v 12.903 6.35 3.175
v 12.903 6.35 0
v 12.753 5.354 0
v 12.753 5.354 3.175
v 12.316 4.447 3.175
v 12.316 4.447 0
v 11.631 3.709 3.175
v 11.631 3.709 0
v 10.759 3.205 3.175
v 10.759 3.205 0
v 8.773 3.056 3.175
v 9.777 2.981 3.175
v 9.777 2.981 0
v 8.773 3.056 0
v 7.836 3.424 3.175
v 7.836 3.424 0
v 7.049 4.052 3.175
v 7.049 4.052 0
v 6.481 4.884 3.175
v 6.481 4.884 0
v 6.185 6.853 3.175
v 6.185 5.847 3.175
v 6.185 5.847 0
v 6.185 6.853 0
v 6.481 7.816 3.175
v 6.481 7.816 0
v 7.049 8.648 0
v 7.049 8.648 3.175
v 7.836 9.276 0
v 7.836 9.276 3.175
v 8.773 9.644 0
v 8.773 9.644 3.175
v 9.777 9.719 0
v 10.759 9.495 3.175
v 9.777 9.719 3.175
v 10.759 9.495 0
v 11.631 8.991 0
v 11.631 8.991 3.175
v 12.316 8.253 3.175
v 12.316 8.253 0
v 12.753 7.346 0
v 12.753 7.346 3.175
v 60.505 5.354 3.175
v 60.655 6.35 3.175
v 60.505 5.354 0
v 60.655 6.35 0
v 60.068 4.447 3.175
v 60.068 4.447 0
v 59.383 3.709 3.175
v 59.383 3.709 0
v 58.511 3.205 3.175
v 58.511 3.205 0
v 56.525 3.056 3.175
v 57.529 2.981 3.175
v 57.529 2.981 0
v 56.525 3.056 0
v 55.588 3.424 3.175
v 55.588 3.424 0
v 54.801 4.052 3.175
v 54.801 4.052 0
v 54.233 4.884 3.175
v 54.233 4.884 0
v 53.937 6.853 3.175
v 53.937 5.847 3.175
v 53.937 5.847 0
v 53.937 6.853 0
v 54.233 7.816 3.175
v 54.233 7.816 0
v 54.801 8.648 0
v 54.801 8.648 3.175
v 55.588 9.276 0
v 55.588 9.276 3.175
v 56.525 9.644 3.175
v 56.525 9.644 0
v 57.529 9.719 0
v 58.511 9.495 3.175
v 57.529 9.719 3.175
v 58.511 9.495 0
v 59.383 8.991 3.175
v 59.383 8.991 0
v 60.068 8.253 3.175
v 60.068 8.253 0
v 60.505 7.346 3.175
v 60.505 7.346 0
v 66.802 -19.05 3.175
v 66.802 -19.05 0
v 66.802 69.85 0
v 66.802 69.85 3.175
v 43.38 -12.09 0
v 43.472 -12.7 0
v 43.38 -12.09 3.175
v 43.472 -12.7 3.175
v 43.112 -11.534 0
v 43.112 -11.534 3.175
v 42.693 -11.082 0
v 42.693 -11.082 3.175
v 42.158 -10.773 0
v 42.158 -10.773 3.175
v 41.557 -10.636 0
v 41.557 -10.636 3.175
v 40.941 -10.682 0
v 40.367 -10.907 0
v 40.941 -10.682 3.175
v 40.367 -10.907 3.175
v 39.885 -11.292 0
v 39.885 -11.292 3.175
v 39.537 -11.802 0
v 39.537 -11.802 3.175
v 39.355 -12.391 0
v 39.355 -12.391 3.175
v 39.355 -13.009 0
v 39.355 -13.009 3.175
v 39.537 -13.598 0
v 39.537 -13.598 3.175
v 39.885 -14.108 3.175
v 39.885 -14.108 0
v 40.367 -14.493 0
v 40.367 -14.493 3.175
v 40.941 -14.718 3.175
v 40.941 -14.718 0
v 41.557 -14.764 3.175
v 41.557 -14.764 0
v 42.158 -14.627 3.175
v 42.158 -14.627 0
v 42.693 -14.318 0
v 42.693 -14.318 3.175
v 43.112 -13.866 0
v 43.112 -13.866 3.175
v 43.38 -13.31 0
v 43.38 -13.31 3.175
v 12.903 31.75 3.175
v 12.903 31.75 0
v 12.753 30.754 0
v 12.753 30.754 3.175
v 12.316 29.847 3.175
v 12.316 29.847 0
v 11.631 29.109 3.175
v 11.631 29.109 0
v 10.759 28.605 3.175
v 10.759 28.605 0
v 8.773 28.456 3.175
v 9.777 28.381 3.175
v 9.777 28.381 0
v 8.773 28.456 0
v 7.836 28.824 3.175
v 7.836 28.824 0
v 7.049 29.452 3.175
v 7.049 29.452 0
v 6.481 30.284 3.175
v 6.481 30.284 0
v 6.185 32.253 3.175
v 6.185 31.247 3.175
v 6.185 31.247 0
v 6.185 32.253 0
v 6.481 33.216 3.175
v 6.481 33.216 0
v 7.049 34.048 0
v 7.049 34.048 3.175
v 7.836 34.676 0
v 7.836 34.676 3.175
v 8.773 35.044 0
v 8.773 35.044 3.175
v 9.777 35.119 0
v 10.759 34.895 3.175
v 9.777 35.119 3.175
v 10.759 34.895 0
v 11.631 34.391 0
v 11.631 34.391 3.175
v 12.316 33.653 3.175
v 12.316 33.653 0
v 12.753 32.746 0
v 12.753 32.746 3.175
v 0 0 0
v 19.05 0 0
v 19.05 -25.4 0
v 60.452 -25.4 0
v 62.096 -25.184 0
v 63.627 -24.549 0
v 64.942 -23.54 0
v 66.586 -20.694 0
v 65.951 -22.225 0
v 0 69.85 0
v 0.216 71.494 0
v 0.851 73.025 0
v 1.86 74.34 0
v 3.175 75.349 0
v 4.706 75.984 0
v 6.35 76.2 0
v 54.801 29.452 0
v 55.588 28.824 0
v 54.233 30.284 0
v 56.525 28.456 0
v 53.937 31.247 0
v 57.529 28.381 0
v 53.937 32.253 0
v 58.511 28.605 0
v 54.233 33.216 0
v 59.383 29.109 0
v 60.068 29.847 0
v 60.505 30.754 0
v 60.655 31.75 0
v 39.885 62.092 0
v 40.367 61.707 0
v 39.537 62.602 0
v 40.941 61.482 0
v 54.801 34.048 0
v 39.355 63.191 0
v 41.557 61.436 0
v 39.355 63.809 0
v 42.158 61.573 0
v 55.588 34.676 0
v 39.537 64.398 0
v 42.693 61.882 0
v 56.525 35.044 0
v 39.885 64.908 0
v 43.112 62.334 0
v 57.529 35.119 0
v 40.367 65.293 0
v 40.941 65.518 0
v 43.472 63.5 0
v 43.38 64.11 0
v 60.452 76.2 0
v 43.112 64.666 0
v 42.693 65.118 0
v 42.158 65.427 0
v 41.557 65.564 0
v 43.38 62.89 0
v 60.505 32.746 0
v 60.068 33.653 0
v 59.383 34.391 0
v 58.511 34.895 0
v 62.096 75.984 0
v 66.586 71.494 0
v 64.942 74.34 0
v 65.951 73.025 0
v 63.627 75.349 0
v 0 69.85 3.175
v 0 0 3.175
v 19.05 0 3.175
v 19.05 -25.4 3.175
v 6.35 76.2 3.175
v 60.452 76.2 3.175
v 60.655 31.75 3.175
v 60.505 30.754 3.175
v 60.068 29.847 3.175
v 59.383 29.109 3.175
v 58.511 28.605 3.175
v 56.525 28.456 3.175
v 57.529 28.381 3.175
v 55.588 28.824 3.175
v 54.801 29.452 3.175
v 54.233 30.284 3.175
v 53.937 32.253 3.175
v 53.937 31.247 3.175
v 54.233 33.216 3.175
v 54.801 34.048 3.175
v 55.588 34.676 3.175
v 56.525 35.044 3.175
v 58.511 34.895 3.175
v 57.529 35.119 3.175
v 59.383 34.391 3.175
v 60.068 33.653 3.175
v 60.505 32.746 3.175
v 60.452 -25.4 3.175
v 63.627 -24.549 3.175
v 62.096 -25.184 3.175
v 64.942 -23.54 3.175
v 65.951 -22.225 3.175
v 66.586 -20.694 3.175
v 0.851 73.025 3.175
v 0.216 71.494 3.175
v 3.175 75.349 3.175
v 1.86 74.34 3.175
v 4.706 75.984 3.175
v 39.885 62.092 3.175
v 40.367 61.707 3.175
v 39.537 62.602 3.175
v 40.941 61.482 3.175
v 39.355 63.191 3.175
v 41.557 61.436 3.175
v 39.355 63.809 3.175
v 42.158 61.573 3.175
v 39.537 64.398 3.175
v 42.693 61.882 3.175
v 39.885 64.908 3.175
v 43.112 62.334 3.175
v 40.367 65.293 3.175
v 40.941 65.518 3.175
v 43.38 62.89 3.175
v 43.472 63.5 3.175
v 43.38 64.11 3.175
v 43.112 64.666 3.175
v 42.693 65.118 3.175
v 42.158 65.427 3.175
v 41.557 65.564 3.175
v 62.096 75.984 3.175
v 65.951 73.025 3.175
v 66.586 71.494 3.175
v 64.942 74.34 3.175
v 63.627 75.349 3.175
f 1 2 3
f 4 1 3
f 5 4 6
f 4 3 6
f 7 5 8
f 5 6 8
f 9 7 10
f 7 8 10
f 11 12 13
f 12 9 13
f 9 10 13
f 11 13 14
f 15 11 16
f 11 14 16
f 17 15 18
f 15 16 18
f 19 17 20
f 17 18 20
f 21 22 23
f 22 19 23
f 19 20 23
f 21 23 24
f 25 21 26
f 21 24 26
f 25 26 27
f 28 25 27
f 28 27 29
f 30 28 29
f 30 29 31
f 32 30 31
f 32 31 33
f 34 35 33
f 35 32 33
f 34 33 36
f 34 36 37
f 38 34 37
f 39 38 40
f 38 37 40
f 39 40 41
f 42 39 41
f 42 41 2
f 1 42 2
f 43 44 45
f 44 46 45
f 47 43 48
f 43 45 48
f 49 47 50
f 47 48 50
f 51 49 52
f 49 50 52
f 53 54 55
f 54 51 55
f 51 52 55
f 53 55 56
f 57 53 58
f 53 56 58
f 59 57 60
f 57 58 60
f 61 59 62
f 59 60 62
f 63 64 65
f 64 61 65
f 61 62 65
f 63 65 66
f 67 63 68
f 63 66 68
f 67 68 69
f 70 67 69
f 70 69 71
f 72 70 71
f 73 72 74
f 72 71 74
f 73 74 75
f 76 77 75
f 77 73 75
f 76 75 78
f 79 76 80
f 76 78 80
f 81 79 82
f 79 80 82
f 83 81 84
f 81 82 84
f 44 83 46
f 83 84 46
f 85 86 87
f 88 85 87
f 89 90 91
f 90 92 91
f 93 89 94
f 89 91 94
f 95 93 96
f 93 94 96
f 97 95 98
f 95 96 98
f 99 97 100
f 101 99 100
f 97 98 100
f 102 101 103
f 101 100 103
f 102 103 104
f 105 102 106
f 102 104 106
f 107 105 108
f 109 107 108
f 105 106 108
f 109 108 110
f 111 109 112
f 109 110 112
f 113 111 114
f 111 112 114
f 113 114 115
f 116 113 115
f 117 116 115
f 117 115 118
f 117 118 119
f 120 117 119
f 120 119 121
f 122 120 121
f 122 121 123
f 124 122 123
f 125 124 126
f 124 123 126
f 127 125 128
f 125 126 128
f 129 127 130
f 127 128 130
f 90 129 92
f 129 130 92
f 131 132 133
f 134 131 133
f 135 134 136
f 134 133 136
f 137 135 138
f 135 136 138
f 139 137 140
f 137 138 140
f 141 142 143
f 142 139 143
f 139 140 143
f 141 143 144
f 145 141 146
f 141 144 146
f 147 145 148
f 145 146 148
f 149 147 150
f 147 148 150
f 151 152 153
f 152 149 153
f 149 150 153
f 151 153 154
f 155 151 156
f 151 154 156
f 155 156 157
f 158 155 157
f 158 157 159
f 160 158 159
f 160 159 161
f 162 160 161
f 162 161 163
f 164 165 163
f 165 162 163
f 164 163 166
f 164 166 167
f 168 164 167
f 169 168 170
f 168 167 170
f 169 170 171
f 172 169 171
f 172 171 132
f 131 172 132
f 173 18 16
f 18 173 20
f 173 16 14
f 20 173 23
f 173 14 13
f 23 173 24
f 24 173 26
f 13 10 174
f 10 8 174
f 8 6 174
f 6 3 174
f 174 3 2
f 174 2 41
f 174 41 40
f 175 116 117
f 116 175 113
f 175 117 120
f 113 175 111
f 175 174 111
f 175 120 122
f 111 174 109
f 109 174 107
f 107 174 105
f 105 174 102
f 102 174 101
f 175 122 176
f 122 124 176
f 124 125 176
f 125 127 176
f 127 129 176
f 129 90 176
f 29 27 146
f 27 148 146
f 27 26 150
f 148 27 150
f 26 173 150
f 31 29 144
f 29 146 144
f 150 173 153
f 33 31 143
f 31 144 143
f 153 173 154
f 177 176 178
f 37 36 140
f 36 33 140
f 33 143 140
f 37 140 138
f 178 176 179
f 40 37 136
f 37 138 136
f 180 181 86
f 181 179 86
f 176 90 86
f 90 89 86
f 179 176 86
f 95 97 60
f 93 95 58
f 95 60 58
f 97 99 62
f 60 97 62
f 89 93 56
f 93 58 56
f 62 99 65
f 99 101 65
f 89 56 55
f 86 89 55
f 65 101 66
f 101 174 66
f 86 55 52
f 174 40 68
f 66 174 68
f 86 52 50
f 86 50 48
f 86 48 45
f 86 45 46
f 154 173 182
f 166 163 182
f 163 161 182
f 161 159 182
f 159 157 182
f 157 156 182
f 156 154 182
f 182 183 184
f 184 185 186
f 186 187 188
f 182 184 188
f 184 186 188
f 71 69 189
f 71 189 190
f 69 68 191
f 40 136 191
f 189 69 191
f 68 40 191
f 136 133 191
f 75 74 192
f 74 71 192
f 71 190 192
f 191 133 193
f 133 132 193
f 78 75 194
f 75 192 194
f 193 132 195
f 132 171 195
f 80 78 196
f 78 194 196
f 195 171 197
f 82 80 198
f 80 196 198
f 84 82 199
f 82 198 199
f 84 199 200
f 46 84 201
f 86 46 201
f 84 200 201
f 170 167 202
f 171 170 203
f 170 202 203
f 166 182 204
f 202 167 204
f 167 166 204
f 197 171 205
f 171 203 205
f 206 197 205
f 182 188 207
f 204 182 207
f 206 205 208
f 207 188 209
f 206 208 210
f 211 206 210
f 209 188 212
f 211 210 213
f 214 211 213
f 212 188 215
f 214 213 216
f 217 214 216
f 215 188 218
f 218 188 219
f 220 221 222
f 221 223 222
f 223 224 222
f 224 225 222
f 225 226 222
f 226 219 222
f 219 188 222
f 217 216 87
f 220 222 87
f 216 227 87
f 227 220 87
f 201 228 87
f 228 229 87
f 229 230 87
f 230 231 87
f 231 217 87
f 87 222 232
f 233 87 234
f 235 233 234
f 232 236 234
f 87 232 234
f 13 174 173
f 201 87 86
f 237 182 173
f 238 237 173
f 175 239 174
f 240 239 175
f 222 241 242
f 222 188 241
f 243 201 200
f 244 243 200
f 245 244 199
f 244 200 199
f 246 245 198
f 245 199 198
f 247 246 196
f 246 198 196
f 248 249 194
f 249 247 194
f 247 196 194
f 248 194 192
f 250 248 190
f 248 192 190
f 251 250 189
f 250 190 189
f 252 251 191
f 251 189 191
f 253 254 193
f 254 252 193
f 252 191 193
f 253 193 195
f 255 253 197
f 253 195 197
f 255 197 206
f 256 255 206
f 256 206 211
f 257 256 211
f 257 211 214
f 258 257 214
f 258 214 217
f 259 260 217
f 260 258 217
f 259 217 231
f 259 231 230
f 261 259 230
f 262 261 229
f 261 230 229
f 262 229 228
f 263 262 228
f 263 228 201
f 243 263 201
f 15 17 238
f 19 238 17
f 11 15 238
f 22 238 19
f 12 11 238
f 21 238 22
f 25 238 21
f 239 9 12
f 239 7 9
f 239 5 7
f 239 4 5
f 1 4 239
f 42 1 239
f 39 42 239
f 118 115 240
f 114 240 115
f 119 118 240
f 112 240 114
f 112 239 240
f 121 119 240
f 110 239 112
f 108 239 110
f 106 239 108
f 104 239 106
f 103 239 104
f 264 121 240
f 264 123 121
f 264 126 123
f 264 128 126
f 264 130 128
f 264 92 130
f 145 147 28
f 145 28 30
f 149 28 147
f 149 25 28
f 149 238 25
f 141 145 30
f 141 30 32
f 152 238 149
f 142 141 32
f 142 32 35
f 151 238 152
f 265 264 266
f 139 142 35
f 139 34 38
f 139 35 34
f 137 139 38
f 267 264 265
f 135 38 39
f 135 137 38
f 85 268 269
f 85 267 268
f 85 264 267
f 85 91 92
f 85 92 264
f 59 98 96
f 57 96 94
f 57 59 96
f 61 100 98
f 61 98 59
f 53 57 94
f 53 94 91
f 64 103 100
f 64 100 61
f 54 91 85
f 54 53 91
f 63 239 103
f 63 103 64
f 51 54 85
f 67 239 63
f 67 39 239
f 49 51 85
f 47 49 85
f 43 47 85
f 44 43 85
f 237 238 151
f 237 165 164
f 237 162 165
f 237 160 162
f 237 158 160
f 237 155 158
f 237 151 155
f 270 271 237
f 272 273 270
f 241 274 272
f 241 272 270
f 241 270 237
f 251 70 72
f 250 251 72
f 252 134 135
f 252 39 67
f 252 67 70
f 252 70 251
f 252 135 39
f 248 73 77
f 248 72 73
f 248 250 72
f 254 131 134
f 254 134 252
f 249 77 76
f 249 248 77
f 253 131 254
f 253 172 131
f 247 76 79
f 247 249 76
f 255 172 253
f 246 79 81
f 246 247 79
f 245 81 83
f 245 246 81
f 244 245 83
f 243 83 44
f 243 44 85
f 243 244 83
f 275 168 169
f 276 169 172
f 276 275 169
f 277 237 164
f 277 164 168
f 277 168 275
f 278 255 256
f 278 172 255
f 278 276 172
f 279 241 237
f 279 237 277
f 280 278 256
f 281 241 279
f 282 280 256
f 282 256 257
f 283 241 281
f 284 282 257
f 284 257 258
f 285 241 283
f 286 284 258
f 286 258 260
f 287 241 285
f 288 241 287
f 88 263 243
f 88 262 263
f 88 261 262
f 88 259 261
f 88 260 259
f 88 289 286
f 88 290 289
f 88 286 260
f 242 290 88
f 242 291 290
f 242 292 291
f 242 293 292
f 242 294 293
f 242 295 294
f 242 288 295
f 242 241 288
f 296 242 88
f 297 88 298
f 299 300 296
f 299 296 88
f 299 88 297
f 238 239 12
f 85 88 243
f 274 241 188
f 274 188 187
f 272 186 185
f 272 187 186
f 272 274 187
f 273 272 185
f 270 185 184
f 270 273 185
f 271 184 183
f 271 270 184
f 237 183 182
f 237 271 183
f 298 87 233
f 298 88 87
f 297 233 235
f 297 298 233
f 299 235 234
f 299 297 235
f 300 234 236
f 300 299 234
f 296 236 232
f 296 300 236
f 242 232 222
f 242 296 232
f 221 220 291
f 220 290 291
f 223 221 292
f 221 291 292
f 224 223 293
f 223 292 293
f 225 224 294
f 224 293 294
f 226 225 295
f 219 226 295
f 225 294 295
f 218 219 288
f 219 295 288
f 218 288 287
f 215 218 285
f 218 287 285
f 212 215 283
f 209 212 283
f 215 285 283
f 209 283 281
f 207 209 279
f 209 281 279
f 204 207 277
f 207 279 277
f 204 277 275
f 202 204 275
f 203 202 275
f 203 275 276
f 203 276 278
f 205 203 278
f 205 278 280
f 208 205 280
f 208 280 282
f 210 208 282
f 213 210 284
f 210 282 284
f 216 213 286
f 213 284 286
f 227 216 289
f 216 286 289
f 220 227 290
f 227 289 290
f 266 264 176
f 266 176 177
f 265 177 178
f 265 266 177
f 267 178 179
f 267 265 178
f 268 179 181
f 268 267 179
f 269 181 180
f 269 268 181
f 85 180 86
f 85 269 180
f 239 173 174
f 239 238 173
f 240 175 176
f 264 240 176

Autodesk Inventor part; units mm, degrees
ref_plane "YZ Plane" through (0, 0, 0) normal (1, 0, 0) x (0, 1, 0)
ref_plane "XZ Plane" through (0, 0, 0) normal (0, 1, 0) x (-1, 0, 0)
ref_plane "XY Plane" through (0, 0, 0) normal (0, 0, 1) x (1, 0, 0)
sketch "Sketch1" plane through (0, 0, 0) normal (0, 0, 1) x (1, 0, 0)
  line L0 (66.802, 0) -> (66.802, 38.1)
  line L1 (0, 38.1) -> (0, 0)
  line L2 (9.525, 31.75) -> (57.277, 31.75) construction
  line L3 (57.277, 31.75) -> (57.277, 6.35) construction
  line L4 (57.277, 6.35) -> (9.525, 6.35) construction
  line L5 (9.525, 6.35) -> (9.525, 31.75) construction
  circle A0 centre (9.525, 31.75) radius 3.3782
  circle A1 centre (9.525, 6.35) radius 3.3782
  circle A2 centre (57.277, 31.75) radius 3.3782
  circle A3 centre (57.277, 6.35) radius 3.3782
  line L6 (0, 0) -> (0, -25.4)
  line L7 (0, -25.4) -> (66.802, -25.4)
  line L8 (66.802, -25.4) -> (66.802, 0)
  line L9 (0, 38.1) -> (0, 76.2)
  line L10 (0, 76.2) -> (66.802, 76.2)
  line L11 (66.802, 76.2) -> (66.802, 38.1)
  point P0 (0, 0)
  dimension "d0" = 38.1
  dimension "d1" = 66.802
  dimension "d2" = 25.4
  dimension "d3" = 47.752
  dimension "d4" = 9.525
  dimension "d6" = 6.7564
  dimension "d7" = 6.7564
  dimension "d8" = 6.7564
  dimension "d9" = 6.7564
  dimension "d14" = 6.35
  dimension "d15" = 9.525
  dimension "d17" = 25.4
  dimension "d18" = 101.6
extrude "Extrusion1" add sketch "Sketch1" along normal blind 3.175
sketch "Sketch4" plane through (0, 0, 3.175) normal (0, 0, 1) x (1, 0, 0)
  line L0 (66.802, -25.4) -> (66.802, 76.2) projected
  line L1 (0, -25.4) -> (66.802, -25.4) projected
  circle A0 centre (41.402, -12.7) radius 2.0701
  circle A1 centre (41.402, 63.5) radius 2.0701
  point P0 (0, 0)
  dimension "d31" = 4.1402
  dimension "d32" = 25.4
  dimension "d33" = 12.7
  dimension "d34" = 4.1402
  dimension "d35" = 76.2
  dimension "d36" = 25.4
extrude "Extrusion4" cut sketch "Sketch4" against normal blind 25.4
fillet "Fillet1" radius 6.35 4 edges at (0, 76.2, 1.5875) (66.802, 76.2, 1.5875) (0, -25.4, 1.5875) (66.802, -25.4, 1.5875)
sketch "Sketch5" plane through (0, 0, 3.175) normal (0, 0, 1) x (1, 0, 0)
  line L0 (0, 69.85) -> (0, -19.05) projected
  arc A0 (0, -19.05) -> (6.35, -25.4) centre (6.35, -19.05) ccw projected
  line L1 (6.35, -25.4) -> (60.452, -25.4) projected
  line L2 (0, 0) -> (19.05, 0)
  line L3 (19.05, 0) -> (19.05, -25.4)
  point P0 (0, 0)
  dimension "d40" = 25.4
  dimension "d41" = 19.05
extrude "Extrusion5" cut sketch "Sketch5" against normal blind 25.4
equation "\"d4\" = -0.5 * d3 + 0.5 * d1"
properties part number "Aluminum Plate (0.125)" material "Aluminum 6061"
